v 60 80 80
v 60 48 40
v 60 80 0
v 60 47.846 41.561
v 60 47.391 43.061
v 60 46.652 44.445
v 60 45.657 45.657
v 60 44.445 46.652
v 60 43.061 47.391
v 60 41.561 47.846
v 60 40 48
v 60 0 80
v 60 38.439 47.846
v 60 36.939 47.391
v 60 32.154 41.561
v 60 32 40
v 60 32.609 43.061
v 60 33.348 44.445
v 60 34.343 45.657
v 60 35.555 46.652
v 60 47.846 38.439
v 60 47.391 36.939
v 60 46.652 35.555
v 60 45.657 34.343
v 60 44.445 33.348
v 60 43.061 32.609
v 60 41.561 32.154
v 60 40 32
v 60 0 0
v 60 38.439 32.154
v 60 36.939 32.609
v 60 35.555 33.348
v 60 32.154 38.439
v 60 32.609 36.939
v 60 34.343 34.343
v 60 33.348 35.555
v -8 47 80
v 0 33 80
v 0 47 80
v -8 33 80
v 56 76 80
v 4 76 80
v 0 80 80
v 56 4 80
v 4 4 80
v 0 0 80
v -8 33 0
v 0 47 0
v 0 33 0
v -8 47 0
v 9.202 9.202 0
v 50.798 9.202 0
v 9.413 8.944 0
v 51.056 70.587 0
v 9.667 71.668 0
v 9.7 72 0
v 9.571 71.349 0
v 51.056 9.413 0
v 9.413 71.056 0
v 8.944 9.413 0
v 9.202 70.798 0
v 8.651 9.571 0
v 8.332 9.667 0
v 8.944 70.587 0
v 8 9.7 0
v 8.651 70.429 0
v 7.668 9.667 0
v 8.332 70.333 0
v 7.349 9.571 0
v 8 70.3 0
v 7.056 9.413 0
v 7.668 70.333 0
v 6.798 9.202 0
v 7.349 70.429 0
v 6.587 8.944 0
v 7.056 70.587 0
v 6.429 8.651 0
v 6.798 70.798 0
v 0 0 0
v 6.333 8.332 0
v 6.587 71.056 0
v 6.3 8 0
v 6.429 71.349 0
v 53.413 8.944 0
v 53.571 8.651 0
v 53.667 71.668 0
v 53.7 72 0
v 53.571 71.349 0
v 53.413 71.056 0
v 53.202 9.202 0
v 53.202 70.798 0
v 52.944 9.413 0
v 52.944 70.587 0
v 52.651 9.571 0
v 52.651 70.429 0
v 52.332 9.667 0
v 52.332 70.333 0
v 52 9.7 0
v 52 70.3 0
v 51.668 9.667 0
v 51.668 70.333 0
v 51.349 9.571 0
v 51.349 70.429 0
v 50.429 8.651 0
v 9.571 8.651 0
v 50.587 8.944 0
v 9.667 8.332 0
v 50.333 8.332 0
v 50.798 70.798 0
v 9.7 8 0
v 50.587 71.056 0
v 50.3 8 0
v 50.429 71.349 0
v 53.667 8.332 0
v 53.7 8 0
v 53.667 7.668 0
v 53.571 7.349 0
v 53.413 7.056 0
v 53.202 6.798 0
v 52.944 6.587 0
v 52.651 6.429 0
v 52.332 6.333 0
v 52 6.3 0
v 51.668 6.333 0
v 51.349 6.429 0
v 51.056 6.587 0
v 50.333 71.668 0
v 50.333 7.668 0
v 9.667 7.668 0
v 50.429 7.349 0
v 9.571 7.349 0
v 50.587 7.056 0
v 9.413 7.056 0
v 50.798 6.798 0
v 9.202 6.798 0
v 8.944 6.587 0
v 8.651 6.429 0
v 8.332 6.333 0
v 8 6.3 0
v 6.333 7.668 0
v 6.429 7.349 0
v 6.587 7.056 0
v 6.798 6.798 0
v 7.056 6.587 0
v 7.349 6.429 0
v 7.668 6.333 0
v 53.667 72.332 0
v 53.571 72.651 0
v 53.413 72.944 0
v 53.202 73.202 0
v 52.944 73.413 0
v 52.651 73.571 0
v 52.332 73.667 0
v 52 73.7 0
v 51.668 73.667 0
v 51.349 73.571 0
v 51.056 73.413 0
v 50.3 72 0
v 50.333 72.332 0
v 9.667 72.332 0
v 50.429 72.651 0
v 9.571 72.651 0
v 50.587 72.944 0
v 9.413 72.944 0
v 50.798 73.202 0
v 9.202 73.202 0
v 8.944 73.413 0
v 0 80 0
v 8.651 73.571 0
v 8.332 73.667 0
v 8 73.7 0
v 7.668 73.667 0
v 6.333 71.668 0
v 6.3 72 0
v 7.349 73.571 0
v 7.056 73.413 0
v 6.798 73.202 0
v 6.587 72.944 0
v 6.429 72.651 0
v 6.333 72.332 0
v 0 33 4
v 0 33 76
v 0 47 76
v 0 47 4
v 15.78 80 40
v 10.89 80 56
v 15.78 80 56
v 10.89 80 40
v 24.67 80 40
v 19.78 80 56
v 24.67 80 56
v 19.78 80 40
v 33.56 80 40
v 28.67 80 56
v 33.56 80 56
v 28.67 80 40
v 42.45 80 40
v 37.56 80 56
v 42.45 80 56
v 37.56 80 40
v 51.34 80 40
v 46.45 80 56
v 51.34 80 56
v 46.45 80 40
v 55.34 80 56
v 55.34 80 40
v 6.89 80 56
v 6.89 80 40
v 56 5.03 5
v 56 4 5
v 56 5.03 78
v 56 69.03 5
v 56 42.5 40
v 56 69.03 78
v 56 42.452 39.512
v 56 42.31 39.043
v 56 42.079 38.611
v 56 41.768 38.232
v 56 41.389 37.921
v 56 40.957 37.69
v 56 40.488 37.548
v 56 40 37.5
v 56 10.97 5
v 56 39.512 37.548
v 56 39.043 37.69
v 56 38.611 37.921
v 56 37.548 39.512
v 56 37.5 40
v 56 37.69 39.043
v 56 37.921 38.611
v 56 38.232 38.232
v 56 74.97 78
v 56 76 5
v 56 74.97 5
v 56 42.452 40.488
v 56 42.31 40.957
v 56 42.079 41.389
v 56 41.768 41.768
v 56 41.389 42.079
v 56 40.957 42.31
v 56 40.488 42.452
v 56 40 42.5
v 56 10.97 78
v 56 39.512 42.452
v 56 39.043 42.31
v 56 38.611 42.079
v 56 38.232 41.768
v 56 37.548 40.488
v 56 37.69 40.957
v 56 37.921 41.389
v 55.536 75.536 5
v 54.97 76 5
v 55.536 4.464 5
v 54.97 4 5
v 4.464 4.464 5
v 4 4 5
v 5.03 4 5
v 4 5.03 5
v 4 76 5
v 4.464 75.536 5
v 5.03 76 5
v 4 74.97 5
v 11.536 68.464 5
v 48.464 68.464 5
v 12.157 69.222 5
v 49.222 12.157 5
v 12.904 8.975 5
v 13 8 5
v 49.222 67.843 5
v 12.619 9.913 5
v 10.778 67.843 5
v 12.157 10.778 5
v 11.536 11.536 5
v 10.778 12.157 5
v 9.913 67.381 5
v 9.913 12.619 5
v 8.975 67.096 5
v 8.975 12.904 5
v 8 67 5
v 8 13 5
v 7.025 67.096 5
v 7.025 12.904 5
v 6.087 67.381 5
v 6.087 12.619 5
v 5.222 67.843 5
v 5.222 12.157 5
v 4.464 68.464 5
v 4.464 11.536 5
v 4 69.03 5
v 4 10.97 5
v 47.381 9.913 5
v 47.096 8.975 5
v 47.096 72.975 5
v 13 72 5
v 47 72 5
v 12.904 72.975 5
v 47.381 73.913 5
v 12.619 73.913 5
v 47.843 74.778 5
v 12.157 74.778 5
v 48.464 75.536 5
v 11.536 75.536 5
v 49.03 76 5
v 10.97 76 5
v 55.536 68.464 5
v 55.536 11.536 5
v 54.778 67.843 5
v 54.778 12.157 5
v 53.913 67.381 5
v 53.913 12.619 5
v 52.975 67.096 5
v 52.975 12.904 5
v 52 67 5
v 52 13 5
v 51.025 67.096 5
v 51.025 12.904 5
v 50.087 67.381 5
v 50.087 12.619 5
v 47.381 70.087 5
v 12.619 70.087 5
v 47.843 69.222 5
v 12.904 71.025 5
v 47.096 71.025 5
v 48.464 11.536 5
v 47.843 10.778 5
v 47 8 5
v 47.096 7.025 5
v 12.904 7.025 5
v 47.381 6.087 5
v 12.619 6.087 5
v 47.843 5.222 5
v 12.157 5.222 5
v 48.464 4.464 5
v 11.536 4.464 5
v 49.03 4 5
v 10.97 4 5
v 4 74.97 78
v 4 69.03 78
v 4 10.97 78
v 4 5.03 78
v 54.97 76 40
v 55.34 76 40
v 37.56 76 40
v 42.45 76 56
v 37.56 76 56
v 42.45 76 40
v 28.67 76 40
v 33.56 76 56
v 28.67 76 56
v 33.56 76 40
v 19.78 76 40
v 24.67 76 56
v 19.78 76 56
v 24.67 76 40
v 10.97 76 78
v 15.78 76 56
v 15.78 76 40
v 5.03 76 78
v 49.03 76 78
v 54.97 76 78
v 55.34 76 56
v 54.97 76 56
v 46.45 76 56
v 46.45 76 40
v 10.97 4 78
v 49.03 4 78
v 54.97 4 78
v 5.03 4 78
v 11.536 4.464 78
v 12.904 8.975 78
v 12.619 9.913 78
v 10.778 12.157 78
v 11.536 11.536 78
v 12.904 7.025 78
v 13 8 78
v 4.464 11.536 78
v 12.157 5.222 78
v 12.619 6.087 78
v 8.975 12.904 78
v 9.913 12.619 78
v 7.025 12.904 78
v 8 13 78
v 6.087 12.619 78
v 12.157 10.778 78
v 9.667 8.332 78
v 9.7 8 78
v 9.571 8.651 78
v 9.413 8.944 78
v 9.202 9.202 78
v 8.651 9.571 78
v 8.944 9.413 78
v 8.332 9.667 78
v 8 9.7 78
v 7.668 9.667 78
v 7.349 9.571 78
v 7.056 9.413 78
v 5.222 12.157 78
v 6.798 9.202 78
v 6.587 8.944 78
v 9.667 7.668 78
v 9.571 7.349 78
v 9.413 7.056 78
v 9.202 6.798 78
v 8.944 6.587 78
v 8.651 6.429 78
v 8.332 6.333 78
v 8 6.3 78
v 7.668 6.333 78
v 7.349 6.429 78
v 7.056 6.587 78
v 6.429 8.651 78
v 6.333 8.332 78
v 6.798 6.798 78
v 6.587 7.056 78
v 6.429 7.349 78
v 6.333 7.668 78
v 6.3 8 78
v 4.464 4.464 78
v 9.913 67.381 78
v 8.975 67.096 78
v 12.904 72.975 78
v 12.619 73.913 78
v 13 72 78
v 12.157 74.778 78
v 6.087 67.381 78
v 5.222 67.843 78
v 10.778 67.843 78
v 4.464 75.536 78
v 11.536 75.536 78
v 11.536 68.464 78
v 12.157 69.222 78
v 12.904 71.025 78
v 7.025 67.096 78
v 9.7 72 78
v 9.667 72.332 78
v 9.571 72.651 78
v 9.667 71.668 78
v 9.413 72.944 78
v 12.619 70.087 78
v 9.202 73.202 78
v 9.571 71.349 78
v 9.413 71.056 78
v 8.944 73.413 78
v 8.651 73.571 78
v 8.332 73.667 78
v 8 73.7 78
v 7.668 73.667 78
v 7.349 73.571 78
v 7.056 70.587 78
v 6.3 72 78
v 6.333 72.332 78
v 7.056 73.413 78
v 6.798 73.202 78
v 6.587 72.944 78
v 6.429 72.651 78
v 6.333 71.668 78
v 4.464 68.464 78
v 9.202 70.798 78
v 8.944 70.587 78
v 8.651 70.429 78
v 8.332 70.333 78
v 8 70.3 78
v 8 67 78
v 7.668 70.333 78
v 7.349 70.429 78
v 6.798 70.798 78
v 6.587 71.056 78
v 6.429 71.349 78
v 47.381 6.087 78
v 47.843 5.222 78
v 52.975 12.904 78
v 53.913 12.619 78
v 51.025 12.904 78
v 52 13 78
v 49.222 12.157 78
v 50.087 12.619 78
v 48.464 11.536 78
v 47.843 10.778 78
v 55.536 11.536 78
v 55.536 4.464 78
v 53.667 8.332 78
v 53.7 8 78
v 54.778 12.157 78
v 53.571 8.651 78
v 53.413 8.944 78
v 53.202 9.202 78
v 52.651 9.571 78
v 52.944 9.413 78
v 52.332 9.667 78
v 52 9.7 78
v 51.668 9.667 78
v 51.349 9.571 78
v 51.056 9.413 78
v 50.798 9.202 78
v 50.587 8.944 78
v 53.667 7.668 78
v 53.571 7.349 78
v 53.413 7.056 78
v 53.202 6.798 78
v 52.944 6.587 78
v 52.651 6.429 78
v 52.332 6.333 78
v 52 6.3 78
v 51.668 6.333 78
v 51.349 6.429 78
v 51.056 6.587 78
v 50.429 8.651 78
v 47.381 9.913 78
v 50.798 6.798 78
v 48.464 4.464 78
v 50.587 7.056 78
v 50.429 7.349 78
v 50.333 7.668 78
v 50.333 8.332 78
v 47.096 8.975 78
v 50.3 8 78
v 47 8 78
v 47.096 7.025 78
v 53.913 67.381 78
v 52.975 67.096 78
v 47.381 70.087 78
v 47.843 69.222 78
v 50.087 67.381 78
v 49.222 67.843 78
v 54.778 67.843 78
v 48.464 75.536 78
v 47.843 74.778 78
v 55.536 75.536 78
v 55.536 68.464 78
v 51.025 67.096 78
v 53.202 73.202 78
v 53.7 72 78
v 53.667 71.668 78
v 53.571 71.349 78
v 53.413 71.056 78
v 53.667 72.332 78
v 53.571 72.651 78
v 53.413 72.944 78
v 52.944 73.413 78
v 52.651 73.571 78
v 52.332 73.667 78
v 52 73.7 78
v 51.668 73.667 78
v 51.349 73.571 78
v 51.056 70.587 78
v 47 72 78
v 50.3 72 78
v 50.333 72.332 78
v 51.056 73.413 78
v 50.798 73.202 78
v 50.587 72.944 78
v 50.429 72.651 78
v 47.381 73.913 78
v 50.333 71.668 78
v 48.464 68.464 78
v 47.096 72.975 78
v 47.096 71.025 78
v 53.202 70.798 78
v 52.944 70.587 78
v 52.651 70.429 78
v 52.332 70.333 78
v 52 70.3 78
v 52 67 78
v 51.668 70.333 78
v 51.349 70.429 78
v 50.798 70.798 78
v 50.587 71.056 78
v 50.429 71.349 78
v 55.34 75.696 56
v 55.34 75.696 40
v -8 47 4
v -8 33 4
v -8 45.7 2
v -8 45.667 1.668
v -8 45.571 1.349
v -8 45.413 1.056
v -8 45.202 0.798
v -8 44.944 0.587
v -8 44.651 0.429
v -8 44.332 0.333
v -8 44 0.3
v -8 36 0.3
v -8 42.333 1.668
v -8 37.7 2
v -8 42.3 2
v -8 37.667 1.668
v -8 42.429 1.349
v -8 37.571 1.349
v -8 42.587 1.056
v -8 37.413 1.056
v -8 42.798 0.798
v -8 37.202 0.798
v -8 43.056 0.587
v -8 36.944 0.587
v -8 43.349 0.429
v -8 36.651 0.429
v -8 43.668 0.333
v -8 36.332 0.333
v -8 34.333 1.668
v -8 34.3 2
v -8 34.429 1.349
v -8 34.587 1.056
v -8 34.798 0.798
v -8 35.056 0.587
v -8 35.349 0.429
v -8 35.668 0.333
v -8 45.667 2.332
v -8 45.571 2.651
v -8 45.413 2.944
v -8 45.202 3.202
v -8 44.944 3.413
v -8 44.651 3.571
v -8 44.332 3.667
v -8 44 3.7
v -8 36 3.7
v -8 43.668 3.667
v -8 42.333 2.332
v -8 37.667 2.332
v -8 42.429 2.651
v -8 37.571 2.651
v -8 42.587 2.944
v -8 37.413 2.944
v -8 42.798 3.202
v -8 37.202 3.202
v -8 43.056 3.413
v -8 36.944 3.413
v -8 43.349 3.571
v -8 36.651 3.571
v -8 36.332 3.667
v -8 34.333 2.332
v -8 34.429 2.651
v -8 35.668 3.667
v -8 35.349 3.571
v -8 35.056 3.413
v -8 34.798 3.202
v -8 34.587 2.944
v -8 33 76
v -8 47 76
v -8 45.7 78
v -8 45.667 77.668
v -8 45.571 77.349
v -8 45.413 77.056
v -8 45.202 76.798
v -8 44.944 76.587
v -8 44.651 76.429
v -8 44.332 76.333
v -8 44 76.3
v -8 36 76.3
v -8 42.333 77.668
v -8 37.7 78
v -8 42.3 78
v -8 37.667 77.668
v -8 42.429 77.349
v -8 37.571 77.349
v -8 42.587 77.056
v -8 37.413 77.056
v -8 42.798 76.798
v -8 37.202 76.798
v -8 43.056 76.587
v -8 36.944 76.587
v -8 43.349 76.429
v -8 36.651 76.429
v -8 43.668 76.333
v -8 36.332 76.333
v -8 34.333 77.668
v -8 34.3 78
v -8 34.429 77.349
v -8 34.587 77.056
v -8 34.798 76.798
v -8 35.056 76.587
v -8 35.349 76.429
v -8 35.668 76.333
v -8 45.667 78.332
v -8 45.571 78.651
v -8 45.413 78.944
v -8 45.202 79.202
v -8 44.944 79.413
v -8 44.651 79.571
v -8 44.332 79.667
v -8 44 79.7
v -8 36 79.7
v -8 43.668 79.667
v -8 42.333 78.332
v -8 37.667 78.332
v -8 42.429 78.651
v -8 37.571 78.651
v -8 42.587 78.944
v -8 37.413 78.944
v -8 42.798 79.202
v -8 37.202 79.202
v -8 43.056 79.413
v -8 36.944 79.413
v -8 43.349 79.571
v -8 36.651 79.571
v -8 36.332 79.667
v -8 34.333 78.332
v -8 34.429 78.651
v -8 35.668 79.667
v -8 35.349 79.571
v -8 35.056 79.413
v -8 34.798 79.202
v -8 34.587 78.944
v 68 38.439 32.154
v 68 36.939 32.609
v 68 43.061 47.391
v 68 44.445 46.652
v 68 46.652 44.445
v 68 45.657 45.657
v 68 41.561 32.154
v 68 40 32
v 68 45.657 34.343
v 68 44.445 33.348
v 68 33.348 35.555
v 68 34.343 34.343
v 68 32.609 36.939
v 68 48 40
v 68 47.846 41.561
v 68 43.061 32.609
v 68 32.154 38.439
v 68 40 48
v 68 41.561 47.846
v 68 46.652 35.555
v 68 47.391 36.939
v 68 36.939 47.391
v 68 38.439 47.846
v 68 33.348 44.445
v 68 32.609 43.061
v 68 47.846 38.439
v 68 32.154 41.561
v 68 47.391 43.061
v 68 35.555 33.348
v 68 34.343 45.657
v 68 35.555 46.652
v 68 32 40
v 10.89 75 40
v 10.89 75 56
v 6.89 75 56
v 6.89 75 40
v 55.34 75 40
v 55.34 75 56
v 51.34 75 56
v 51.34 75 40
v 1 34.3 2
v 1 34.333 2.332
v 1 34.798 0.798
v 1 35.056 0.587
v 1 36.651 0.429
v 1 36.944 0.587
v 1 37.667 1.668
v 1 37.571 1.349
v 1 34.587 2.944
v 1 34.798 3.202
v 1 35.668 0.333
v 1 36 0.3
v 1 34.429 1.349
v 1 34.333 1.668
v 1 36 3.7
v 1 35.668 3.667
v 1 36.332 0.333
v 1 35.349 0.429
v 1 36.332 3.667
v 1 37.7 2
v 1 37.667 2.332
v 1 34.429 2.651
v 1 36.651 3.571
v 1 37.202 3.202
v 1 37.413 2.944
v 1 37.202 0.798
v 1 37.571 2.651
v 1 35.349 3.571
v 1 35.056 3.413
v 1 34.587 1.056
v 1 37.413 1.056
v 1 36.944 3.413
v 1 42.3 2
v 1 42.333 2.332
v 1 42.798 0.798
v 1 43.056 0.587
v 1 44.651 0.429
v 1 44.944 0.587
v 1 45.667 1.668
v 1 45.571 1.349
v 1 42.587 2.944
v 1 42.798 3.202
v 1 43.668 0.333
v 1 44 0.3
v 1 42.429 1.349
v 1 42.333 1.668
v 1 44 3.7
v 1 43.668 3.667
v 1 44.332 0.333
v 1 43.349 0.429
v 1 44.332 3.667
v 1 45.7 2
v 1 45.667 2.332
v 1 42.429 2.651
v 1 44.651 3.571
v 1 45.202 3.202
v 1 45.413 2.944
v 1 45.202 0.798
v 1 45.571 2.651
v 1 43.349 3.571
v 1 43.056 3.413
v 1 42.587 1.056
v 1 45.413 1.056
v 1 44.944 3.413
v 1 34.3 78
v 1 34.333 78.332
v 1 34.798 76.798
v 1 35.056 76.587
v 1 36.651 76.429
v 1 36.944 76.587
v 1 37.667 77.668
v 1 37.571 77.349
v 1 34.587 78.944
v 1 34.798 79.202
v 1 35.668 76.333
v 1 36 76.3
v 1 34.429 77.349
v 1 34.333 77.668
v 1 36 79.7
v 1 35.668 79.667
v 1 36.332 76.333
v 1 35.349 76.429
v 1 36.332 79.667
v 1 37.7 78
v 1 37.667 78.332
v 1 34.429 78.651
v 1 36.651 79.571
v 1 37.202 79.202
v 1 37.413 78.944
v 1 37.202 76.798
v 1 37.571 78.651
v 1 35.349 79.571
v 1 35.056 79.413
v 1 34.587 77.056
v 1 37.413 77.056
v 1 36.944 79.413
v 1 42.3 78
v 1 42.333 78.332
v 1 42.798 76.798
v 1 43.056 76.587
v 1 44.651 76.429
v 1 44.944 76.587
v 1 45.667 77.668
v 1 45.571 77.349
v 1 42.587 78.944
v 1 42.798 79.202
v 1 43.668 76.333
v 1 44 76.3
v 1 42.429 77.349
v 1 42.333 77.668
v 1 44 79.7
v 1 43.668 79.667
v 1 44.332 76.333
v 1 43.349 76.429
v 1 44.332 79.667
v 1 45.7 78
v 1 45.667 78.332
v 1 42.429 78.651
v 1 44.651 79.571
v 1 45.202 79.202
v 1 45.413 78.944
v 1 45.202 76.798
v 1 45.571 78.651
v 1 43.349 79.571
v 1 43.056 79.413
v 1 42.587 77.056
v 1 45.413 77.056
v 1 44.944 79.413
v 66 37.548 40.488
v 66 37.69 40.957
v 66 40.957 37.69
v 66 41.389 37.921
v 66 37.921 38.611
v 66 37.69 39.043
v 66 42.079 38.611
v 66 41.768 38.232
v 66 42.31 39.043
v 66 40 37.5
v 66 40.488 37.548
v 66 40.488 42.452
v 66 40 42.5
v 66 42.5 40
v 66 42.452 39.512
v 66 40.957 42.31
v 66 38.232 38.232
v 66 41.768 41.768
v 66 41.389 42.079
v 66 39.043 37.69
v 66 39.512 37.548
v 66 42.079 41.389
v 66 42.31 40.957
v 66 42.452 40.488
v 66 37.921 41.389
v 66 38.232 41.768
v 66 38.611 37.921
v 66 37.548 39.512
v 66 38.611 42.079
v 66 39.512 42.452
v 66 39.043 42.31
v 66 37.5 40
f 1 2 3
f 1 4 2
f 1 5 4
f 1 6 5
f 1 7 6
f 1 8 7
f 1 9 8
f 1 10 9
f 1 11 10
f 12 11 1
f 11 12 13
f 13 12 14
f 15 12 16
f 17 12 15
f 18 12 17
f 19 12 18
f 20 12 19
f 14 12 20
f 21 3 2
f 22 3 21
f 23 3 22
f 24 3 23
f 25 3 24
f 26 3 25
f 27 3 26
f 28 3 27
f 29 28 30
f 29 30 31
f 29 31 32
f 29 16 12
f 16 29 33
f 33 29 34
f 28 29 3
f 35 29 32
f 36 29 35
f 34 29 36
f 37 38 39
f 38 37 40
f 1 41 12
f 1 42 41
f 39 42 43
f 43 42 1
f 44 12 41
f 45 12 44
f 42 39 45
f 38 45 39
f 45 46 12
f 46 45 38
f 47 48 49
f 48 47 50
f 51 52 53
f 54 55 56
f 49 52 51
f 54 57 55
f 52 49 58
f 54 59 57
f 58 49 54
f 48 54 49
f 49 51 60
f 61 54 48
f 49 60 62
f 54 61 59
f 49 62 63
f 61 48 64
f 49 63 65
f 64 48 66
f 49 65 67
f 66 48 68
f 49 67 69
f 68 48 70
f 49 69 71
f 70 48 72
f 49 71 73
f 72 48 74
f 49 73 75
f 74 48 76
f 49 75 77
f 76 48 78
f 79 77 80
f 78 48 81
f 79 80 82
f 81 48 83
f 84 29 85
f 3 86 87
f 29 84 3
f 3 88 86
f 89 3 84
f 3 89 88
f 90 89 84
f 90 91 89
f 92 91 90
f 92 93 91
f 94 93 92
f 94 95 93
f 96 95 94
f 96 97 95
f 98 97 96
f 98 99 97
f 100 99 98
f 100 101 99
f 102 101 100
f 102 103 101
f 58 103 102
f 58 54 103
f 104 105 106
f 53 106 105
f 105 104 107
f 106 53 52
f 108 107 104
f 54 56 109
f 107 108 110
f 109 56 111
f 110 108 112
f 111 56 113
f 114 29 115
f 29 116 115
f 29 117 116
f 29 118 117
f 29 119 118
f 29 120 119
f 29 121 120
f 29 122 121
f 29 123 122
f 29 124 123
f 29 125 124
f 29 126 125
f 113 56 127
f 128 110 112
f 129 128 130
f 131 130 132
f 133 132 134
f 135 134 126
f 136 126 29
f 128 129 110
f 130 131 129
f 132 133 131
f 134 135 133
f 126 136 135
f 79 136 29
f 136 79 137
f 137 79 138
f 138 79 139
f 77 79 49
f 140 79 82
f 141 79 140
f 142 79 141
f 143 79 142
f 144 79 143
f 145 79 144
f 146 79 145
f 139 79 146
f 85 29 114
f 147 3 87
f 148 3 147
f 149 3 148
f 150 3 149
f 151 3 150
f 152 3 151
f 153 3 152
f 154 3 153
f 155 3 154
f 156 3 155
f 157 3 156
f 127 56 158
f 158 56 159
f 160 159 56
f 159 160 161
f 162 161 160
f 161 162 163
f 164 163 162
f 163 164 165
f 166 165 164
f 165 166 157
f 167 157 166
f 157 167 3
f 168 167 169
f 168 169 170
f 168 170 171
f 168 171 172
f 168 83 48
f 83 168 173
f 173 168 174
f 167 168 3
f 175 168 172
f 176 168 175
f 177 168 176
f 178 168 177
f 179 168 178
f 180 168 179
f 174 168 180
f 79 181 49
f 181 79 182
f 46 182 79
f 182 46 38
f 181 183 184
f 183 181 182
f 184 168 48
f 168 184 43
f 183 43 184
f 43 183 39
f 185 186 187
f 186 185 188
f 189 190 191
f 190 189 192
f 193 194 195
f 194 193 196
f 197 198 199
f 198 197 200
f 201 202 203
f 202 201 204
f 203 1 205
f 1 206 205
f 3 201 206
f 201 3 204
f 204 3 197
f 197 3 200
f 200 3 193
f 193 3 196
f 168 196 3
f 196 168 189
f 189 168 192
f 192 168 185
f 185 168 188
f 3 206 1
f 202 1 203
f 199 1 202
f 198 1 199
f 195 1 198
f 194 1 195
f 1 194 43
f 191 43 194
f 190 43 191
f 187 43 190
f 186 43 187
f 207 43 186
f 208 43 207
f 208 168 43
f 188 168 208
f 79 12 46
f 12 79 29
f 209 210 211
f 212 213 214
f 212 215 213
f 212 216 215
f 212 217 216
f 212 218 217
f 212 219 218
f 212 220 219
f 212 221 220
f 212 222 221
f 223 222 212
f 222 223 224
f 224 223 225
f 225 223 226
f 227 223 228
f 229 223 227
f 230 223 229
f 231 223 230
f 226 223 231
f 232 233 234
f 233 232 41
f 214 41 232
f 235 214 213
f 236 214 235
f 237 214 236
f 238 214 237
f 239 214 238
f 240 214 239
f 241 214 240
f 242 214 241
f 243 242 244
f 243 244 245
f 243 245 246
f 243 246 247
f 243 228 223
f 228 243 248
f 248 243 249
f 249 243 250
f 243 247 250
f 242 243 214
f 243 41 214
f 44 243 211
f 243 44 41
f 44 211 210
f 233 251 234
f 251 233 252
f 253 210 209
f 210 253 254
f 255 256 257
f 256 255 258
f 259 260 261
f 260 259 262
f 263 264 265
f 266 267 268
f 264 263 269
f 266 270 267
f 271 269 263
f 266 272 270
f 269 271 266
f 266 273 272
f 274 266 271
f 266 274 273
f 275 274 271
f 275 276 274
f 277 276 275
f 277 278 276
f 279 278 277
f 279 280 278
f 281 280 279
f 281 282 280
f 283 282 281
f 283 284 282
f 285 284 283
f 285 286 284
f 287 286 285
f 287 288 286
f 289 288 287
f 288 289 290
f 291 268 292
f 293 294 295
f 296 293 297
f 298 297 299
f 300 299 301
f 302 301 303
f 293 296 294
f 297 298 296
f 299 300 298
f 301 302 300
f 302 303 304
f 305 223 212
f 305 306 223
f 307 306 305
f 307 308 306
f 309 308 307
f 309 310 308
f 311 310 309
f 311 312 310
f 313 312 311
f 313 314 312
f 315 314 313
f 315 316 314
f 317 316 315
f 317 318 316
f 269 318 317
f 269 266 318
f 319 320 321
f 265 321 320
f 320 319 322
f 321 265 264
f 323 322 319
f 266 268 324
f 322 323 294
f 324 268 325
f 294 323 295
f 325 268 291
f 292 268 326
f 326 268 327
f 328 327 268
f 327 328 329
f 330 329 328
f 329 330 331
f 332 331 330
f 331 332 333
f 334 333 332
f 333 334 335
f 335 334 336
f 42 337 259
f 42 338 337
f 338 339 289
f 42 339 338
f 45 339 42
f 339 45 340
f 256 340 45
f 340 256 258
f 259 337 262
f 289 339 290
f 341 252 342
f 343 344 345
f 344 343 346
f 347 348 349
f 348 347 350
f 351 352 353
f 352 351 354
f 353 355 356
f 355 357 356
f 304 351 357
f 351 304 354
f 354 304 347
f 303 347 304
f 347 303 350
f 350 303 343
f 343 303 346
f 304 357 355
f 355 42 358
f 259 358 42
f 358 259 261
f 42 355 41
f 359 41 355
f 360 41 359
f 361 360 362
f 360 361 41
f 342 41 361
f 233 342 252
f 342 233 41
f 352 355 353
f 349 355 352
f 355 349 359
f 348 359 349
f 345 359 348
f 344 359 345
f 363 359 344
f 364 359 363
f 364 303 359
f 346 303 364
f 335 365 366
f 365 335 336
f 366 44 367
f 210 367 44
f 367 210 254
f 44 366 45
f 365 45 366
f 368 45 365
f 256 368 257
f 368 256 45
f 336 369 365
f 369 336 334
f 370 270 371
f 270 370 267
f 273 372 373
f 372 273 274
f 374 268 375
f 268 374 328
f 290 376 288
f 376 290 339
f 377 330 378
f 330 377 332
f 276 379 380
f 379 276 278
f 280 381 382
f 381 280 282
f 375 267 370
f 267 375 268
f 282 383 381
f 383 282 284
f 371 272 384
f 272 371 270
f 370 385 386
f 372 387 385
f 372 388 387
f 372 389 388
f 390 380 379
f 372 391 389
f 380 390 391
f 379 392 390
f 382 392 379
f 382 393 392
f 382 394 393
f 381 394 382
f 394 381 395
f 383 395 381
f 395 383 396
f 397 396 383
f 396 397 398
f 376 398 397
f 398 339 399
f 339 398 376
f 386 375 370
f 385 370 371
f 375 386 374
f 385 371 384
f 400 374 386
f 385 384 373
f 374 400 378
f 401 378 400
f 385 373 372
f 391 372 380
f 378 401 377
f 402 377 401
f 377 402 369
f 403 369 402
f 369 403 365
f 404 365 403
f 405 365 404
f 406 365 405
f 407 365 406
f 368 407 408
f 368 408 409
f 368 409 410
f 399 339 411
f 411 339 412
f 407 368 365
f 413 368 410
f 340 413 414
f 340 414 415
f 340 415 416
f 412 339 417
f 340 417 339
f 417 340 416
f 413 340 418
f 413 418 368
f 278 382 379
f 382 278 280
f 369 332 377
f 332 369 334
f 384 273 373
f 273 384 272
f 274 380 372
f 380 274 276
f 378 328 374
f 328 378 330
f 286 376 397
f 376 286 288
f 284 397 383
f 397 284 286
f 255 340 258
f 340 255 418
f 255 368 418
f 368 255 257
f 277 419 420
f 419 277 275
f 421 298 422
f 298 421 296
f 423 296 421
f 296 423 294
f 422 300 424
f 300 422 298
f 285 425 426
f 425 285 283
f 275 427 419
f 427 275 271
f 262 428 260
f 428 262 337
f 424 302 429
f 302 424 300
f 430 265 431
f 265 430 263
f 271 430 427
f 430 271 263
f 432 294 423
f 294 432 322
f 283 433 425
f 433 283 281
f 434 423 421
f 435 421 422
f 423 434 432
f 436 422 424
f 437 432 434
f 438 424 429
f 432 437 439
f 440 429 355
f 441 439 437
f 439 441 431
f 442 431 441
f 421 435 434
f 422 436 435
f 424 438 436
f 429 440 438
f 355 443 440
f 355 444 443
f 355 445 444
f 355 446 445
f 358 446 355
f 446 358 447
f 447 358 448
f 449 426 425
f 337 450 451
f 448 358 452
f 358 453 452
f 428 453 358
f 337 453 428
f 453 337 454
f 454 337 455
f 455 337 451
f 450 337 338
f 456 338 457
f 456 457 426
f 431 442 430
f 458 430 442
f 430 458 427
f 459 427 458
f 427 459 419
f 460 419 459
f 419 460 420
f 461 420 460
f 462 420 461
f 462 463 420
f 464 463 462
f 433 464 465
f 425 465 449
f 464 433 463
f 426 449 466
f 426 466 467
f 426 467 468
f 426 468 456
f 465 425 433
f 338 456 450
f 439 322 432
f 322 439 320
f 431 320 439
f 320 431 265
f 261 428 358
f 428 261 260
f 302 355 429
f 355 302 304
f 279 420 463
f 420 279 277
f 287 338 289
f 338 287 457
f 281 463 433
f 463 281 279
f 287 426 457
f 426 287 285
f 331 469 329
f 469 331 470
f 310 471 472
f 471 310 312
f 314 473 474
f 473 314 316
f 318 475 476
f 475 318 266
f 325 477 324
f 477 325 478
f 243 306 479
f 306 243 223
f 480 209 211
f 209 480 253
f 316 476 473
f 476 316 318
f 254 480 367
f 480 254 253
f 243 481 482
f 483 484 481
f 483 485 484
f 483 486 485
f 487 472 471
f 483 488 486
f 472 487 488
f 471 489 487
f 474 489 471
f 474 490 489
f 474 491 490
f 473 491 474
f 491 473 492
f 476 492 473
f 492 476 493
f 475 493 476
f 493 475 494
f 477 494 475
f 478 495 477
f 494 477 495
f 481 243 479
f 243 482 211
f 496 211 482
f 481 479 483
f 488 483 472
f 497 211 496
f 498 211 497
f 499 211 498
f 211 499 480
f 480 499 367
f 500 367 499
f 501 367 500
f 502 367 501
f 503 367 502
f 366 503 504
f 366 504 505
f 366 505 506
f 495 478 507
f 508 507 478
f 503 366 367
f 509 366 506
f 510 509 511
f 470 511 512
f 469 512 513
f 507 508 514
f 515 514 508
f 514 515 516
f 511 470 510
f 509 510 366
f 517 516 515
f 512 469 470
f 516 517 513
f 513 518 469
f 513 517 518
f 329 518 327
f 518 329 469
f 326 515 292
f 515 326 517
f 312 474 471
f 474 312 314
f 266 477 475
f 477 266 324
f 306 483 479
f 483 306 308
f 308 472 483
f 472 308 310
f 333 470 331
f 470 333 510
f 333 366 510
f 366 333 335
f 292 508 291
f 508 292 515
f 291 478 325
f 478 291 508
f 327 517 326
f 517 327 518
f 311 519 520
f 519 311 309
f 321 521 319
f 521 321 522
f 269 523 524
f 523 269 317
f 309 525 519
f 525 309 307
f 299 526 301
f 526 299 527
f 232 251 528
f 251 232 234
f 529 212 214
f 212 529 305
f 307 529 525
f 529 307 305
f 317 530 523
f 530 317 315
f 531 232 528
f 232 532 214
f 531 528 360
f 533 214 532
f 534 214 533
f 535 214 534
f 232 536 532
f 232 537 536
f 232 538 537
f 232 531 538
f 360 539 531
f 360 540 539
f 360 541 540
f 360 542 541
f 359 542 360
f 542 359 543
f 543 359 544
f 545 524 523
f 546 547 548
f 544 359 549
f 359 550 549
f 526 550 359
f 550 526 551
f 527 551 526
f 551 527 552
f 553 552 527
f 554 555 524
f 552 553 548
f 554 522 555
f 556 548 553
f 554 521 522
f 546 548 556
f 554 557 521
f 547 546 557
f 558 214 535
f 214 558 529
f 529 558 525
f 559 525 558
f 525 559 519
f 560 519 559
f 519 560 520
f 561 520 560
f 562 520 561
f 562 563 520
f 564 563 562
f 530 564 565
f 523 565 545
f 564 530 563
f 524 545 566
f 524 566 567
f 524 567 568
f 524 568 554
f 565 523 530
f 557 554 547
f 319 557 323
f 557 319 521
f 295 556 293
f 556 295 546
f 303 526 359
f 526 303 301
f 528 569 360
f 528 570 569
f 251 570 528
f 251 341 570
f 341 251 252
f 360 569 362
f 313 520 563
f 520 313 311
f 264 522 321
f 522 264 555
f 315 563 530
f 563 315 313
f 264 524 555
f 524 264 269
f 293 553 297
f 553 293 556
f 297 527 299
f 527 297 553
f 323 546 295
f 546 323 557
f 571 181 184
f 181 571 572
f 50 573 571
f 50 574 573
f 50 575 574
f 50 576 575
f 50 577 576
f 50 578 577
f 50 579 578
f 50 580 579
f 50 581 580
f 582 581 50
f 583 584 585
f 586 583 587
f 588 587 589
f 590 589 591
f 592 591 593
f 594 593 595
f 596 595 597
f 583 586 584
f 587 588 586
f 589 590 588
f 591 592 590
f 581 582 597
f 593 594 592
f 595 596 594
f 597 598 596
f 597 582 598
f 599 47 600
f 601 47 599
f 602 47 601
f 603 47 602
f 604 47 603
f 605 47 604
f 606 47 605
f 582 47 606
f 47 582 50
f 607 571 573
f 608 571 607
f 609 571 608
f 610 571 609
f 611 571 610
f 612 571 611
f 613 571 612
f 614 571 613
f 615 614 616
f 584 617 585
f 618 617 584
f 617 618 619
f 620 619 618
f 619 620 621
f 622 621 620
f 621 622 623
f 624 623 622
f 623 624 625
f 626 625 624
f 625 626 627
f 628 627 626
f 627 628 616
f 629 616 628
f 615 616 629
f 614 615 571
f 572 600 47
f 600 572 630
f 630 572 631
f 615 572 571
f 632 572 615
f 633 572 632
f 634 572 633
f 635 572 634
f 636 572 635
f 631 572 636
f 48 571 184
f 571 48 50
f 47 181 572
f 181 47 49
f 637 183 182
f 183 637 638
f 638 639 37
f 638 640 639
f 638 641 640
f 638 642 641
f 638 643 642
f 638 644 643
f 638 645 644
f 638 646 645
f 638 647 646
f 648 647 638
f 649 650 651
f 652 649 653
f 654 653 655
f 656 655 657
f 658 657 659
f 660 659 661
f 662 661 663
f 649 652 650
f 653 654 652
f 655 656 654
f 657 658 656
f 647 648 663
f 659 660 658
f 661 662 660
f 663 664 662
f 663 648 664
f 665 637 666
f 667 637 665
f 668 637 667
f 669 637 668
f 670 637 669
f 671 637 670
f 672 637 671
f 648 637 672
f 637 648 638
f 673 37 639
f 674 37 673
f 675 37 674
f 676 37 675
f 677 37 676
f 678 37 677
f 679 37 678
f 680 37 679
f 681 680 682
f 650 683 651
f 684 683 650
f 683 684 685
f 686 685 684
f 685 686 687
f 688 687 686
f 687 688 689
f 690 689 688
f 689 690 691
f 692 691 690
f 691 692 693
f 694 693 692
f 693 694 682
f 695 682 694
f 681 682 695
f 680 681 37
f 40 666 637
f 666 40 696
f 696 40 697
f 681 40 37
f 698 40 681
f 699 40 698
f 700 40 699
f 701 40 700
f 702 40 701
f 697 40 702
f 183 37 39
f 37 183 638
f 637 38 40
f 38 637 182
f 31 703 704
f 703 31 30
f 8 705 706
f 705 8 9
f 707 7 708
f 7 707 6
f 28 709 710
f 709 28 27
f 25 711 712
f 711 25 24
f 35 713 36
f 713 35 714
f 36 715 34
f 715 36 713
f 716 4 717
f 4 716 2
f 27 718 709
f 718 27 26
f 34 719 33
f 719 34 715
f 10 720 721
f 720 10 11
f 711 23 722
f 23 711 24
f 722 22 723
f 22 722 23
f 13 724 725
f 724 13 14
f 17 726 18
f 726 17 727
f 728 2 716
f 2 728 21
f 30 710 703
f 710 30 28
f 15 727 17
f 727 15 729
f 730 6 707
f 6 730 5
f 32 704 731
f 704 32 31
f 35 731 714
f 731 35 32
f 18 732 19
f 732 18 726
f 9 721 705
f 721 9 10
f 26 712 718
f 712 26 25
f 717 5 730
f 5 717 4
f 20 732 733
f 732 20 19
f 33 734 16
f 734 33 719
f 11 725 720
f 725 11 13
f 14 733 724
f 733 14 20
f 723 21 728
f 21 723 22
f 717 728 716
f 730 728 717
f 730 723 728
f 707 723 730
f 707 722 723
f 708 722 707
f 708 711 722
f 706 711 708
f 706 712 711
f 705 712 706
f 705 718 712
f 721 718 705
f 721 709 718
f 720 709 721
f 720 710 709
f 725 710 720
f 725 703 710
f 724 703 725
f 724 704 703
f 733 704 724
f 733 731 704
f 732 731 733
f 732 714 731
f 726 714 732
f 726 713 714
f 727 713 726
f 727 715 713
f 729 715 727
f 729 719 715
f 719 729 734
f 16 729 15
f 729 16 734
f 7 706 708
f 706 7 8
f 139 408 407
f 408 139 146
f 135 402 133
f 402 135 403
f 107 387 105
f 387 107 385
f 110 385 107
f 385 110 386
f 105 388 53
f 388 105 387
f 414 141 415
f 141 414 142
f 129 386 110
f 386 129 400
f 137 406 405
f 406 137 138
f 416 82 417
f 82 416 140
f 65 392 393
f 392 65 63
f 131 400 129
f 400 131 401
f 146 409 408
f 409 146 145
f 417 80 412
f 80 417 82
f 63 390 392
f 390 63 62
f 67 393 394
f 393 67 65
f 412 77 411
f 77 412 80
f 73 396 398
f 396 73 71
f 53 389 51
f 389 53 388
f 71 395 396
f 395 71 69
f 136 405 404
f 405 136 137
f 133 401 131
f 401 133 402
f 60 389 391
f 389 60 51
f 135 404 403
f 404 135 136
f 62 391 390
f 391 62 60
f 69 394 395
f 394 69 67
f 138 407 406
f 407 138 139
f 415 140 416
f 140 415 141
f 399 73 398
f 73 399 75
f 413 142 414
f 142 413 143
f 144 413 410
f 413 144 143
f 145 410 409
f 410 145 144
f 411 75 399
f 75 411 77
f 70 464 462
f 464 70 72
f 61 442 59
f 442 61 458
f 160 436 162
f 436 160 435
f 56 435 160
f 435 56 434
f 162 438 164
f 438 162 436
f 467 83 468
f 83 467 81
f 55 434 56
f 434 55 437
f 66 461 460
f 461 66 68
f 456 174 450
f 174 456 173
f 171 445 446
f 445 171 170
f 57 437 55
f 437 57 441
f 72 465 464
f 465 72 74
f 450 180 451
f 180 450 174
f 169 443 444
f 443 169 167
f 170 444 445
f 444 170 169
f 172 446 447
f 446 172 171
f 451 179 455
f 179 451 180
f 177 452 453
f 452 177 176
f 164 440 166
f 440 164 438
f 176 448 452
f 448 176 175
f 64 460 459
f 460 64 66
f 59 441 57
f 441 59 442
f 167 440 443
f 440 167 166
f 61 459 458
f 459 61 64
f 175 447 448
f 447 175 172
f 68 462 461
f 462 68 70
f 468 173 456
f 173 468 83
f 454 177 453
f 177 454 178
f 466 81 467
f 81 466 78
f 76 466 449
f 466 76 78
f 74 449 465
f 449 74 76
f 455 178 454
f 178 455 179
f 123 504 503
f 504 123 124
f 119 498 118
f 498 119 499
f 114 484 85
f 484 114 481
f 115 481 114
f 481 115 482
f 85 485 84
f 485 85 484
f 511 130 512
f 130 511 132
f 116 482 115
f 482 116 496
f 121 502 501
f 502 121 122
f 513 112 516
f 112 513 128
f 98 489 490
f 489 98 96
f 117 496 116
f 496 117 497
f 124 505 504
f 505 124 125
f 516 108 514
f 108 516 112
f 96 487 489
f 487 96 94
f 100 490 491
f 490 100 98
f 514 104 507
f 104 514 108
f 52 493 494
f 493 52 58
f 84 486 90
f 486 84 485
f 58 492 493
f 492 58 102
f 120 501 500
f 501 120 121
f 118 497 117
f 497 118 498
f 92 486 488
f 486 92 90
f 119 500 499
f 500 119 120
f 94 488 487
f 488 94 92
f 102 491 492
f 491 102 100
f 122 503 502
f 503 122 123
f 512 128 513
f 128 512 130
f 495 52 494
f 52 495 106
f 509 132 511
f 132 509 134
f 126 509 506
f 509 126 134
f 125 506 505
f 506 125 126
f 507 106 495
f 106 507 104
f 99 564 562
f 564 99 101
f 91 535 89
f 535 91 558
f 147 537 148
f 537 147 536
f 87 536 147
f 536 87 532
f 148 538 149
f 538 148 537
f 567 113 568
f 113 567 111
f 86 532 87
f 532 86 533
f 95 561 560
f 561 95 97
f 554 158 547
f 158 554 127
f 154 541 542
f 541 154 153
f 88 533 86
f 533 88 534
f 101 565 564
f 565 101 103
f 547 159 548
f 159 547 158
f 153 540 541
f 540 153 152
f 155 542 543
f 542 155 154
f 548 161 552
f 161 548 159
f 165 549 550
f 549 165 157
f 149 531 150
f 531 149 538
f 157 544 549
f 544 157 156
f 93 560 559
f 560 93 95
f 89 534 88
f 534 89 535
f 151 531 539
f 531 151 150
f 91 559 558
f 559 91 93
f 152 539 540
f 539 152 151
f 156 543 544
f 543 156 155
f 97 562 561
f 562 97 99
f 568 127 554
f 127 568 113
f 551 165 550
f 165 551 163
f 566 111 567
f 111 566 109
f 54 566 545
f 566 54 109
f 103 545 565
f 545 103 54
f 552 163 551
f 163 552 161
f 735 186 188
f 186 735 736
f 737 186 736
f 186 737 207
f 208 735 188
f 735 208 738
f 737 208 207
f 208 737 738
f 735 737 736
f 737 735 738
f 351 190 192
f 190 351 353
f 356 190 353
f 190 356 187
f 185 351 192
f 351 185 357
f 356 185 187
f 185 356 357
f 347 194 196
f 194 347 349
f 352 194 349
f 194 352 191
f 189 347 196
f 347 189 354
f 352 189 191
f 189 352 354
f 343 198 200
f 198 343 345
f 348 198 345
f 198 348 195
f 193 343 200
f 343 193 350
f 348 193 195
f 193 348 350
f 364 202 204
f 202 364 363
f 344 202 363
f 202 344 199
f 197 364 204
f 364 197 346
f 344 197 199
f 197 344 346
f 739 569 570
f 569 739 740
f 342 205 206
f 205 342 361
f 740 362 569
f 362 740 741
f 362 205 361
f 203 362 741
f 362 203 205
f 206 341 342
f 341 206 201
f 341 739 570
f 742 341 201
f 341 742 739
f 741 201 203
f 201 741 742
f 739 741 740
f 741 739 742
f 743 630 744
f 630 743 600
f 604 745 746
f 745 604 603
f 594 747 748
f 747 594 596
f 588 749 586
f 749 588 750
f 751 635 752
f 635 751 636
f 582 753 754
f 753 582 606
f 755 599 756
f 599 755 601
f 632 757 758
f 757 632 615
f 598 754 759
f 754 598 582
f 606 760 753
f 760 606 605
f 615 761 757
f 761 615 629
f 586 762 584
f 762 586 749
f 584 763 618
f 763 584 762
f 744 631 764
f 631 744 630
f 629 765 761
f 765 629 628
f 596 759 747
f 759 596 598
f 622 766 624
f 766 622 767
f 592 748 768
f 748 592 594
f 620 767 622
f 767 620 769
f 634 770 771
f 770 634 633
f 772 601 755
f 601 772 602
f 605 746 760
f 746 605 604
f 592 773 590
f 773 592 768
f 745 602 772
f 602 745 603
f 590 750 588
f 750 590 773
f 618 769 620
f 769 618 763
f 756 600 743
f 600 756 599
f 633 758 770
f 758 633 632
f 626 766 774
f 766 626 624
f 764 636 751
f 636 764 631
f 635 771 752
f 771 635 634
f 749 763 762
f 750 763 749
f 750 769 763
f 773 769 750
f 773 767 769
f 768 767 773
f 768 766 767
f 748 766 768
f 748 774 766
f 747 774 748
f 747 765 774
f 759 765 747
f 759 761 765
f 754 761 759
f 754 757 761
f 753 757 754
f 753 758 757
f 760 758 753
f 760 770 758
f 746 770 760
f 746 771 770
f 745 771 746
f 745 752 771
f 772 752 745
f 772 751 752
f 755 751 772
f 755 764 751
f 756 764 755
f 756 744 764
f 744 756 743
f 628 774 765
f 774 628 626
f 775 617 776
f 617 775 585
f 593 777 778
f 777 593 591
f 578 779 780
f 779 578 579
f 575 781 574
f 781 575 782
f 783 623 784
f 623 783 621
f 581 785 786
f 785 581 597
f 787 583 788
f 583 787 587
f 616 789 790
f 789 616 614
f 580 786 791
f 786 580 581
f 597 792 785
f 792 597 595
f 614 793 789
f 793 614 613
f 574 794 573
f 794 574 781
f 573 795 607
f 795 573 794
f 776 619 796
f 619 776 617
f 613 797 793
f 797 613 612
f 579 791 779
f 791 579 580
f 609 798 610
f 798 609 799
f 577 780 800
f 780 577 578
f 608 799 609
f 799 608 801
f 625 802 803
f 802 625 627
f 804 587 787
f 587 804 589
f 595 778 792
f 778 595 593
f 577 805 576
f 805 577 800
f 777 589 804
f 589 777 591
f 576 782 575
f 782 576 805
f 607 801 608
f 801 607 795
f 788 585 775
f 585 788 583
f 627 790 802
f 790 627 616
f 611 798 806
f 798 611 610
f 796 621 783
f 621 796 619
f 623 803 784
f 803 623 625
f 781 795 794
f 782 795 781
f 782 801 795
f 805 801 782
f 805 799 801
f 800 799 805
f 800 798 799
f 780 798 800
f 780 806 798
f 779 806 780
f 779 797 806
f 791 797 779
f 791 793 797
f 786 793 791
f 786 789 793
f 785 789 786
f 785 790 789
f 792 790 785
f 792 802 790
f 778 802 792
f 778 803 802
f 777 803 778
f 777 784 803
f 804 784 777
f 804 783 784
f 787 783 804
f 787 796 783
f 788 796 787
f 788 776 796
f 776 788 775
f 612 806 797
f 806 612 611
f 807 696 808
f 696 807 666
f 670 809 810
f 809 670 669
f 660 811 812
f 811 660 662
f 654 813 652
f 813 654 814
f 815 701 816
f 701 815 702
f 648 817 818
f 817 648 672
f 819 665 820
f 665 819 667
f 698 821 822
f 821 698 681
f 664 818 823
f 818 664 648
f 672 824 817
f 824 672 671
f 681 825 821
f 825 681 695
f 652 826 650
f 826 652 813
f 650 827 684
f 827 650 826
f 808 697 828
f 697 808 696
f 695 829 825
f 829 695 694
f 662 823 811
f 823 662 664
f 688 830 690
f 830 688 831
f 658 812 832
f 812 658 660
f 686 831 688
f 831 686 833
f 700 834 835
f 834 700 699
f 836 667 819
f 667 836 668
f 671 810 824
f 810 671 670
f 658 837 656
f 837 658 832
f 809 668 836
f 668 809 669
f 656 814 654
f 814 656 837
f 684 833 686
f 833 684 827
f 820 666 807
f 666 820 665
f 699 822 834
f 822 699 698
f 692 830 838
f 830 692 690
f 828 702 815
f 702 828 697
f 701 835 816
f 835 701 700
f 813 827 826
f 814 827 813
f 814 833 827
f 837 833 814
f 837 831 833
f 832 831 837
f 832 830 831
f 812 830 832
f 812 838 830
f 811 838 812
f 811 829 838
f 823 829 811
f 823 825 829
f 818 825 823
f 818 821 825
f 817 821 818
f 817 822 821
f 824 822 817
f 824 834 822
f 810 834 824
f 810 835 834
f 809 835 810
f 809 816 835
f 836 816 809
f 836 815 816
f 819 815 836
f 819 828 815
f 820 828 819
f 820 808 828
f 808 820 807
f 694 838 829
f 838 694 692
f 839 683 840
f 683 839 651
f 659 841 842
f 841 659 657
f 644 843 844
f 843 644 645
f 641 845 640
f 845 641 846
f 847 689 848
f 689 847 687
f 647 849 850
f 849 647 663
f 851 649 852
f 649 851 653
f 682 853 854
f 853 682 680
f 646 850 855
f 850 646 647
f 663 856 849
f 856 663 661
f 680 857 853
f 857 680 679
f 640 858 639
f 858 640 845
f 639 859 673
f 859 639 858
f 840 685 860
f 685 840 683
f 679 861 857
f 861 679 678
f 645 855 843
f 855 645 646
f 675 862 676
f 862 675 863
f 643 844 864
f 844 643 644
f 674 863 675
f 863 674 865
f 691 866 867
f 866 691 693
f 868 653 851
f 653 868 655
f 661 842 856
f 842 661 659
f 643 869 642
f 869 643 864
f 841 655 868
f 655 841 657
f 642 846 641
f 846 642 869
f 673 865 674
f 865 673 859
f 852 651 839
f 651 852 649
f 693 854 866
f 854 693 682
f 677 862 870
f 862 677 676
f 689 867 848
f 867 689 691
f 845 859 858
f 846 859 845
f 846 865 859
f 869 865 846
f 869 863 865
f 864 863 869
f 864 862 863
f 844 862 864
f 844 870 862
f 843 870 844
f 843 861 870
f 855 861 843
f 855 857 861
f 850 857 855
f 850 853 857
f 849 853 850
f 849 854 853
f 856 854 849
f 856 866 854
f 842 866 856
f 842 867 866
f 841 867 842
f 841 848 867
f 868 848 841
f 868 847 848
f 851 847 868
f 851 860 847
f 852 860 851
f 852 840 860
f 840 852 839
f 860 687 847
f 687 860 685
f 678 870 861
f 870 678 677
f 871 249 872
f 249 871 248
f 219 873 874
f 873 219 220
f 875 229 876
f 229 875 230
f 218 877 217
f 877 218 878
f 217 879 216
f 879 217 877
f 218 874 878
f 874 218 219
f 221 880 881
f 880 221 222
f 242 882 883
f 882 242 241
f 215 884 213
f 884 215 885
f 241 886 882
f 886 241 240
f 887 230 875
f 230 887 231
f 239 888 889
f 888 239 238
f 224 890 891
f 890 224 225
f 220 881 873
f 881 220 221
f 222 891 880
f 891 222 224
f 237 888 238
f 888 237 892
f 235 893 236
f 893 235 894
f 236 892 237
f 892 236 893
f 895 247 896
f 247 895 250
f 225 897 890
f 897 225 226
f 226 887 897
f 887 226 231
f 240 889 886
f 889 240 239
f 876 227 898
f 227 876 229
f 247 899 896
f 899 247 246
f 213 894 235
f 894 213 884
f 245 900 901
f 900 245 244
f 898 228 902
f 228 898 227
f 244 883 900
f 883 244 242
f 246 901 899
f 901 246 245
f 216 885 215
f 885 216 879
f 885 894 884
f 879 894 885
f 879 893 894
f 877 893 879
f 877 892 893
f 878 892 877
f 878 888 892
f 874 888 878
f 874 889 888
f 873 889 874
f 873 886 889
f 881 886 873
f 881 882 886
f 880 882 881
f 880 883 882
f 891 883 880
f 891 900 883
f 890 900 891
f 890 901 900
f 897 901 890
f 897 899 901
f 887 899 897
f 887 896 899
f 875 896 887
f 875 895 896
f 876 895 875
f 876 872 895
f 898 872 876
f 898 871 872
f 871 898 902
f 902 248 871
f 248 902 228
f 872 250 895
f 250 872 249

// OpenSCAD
$fn = 32;

// ----------------------------------------------------------------------
// Enclosure body: 60 x 80 x 80 mm, wall 4 mm
// ----------------------------------------------------------------------

// --- parameters (mm) ---
length = 60;              // outside length, X
width = 80;               // outside width, Y
height = 80;              // outside height, Z
wall = 4;                 // side wall thickness
floor_t = 5;              // floor thickness
boss_d = 10;              // corner boss diameter
boss_h = 73;              // corner boss height above the floor
boss_hole_d = 3.4;        // lid screw clearance in the boss
boss_lip = 8;             // boss centre inset from the corner
ear_w = 14;               // mounting ear width
ear_t = 4;                // mounting ear thickness
ear_ext = 8;              // mounting ear reach
ear_hole_d = 3.4;         // mounting ear drills
vent_slots = 8;           // vent slots in the long wall
vent_w = 4;               // vent slot width
vent_h = 16;              // vent slot height
vent_pitch = 8.89;        // vent slot pitch
vent_z = 40;              // vent slot sill height
nipple_d = 16;            // cable gland boss diameter
nipple_h = 8;             // cable gland boss height
nipple_bore = 5;          // cable gland bore

module shell() {
  difference() {
    cube([length, width, height]);
    /* hollow, open at the top */
    translate([wall, wall, floor_t])
      cube([length - 2 * wall, width - 2 * wall, height]);
  }
}

module bosses() {
  /* corner bosses, sunk 1 mm into the floor */
  for (sx = [0, 1]) for (sy = [0, 1])
    translate([sx * (length - 2 * boss_lip) + boss_lip, sy * (width - 2 * boss_lip) + boss_lip, floor_t - 1])
      cylinder(h = boss_h + 1, d = boss_d);
}

module gland() {
  /* boss on the short wall, sunk 1 mm into it */
  translate([length - 1, width / 2, height * 0.5]) rotate([0, 90, 0])
    cylinder(h = nipple_h + 1, d = nipple_d);
}

module ears() {
  /* mounting ears on the short walls, sunk into the wall */
  for (sz = [0, 1])
    translate([-ear_ext, width / 2 - ear_w / 2, sz * (height - ear_t)])
      cube([ear_ext + 2.5, ear_w, ear_t]);
}

difference() {
  union() {
    shell();
    bosses();
    gland();
    ears();
  }
  /* boss screw holes */
  for (sx = [0, 1]) for (sy = [0, 1])
    translate([sx * (length - 2 * boss_lip) + boss_lip, sy * (width - 2 * boss_lip) + boss_lip, -1]) cylinder(h = floor_t + boss_h + 2, d = boss_hole_d);
  /* vent grille in the +Y wall */
  for (i = [0 : vent_slots - 1]) translate([vent_pitch * (i + 1) - vent_w / 2, width - wall - 1, vent_z]) cube([vent_w, wall + 2, vent_h]);
  translate([length, width / 2, height * 0.5]) rotate([0, 90, 0]) translate([0, 0, -nipple_h - 2]) cylinder(h = nipple_h + wall + 4, d = nipple_bore);
  for (sz = [0, 1]) for (sx = [0, 1]) translate([-ear_ext - 1, width / 2 + (2 * sx - 1) * (ear_w / 2 - 3), sz * (height - ear_t) + ear_t / 2]) rotate([0, 90, 0]) cylinder(h = ear_ext + 2, d = ear_hole_d);
}
